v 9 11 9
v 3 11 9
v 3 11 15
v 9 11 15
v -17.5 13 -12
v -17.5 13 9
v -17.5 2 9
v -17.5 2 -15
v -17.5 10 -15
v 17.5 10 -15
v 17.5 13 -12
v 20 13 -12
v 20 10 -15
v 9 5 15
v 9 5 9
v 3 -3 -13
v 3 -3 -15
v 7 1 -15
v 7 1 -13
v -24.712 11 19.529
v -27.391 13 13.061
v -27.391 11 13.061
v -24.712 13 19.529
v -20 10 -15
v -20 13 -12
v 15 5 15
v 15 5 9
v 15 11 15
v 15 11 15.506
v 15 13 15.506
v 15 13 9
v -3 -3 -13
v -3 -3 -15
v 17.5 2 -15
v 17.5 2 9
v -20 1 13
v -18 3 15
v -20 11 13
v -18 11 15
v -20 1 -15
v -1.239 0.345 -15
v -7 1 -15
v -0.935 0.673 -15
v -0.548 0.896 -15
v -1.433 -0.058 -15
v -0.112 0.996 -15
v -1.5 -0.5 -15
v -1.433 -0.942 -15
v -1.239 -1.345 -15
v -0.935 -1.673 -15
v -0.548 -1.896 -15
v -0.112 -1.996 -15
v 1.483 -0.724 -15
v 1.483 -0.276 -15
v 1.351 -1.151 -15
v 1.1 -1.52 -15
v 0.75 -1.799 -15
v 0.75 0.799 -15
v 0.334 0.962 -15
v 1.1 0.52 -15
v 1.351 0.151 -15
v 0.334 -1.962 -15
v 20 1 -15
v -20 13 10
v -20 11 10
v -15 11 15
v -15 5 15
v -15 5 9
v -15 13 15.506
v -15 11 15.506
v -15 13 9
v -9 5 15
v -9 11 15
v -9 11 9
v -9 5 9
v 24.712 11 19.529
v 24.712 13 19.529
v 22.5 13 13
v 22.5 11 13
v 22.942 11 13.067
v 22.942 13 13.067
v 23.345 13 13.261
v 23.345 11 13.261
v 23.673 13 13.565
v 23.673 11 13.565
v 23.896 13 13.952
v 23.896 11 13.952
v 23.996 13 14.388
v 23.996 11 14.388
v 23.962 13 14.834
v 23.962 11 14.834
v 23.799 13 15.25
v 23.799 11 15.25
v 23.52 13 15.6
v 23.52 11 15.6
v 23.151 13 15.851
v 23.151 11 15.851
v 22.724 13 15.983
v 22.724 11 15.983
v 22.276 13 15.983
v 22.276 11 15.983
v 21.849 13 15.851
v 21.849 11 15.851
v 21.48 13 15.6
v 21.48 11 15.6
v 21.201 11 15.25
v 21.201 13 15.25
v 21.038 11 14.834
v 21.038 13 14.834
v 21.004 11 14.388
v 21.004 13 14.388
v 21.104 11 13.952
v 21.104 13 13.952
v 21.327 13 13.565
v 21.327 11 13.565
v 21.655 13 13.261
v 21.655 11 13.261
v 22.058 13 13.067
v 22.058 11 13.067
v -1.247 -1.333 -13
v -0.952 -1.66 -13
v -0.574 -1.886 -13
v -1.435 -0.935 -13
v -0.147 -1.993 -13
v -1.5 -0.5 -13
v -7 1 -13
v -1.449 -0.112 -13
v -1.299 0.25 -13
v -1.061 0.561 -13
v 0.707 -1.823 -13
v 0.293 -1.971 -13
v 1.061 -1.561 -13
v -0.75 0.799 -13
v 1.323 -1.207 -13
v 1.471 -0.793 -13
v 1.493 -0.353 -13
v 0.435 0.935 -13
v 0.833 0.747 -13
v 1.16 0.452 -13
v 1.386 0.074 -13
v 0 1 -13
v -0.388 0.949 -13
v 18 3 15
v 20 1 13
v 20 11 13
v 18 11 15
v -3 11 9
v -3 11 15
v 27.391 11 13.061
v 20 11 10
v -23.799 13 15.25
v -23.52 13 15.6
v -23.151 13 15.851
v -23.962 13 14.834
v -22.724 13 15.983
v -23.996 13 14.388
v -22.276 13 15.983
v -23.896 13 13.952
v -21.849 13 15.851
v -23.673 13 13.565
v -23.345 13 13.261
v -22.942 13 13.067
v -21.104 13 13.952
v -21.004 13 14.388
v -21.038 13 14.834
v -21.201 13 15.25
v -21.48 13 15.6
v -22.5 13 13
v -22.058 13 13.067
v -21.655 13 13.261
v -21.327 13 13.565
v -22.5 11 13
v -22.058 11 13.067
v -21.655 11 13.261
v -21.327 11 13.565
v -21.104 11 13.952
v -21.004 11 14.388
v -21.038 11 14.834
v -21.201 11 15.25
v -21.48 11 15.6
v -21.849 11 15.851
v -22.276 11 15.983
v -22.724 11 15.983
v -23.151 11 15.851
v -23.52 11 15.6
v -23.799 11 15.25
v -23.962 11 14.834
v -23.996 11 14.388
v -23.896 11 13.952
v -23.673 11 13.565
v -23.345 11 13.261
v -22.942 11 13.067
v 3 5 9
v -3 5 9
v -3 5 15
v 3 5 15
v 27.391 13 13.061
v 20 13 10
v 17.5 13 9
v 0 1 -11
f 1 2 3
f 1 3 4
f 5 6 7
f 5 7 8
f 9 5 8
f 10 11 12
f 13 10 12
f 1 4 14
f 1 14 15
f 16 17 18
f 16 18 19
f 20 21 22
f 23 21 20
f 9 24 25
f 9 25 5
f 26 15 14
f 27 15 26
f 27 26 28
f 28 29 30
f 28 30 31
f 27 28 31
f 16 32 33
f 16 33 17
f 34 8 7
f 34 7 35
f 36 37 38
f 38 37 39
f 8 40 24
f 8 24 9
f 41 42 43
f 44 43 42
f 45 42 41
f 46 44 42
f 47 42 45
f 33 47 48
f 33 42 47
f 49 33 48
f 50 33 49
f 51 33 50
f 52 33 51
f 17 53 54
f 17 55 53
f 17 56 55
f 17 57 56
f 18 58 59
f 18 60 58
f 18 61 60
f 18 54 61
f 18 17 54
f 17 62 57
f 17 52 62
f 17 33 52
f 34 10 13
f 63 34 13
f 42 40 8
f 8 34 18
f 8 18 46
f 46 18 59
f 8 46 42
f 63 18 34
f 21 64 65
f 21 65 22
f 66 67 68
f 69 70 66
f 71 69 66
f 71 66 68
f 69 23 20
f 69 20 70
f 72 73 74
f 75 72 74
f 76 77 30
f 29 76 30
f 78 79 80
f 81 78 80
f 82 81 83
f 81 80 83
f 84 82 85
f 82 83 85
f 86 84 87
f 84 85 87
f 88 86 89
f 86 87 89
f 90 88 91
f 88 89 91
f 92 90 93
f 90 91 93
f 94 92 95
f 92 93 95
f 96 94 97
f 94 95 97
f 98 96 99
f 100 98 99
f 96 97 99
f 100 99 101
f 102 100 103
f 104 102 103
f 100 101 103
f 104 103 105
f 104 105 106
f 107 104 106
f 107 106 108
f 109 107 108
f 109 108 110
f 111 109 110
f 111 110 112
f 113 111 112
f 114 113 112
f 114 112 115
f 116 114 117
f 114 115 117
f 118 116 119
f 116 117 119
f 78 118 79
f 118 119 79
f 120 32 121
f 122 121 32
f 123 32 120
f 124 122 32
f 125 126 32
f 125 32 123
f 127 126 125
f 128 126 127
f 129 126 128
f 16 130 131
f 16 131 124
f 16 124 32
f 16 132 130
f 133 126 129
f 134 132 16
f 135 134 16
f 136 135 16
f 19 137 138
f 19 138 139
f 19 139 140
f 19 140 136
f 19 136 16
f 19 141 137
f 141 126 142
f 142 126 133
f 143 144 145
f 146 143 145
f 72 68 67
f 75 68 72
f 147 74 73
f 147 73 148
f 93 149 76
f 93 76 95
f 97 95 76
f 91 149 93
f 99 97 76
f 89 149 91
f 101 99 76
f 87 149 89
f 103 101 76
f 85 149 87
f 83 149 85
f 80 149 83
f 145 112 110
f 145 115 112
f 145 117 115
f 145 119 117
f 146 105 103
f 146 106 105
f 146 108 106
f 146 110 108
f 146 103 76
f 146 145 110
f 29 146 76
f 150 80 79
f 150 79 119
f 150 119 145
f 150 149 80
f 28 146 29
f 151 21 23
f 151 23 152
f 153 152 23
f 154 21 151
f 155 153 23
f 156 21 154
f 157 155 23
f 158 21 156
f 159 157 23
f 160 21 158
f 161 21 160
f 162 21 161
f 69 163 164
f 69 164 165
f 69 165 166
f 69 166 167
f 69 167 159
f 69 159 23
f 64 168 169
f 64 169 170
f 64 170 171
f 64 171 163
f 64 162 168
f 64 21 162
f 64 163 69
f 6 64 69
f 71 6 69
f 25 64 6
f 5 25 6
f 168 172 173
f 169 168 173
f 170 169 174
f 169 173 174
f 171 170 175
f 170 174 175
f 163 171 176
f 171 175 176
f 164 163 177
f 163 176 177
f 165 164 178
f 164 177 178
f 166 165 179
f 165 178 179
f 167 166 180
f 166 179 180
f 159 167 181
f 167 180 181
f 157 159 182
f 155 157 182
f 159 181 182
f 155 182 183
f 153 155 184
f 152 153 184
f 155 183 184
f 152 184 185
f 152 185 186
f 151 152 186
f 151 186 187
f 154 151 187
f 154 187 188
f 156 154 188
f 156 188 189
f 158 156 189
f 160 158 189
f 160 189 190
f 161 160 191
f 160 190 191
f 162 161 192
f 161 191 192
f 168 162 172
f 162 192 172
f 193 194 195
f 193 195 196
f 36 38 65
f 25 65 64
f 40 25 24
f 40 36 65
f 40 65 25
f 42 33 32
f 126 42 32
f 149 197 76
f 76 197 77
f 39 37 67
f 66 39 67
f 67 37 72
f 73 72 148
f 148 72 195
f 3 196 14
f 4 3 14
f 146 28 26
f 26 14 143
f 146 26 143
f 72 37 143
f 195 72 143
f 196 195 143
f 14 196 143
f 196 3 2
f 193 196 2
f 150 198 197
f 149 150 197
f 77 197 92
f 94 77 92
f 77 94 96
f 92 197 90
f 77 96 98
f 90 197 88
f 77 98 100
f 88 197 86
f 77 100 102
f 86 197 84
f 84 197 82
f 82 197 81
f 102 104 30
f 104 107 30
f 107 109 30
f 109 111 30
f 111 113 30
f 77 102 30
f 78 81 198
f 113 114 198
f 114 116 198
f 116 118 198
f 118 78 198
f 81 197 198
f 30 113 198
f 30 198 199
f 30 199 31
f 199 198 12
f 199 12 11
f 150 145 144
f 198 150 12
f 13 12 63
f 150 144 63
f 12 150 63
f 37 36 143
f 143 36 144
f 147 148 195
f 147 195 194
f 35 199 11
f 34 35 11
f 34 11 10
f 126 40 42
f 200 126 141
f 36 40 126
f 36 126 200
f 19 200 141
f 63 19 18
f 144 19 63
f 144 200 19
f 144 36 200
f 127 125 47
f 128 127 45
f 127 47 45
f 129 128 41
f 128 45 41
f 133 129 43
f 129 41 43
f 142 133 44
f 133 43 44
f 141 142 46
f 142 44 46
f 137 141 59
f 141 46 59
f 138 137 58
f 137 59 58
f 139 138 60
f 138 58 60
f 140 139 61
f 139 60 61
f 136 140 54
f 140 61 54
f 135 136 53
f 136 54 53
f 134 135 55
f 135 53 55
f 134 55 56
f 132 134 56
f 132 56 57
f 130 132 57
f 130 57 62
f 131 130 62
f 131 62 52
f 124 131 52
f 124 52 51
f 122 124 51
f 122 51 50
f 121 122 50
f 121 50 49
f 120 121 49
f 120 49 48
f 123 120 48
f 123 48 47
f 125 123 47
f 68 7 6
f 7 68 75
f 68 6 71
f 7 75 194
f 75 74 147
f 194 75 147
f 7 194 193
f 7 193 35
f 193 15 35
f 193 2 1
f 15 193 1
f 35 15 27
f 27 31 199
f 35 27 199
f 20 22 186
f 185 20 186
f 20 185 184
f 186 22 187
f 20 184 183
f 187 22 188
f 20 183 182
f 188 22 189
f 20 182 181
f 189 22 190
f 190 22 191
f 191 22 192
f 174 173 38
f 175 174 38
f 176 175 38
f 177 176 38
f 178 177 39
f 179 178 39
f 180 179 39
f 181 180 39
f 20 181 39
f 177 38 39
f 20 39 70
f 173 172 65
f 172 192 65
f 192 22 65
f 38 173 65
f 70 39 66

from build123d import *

# Parameters (mm, degrees)
SKETCH1_W           = 40
SKETCH1_H           = 30
BOSS_EXTRUDE1_DEPTH = 10
SKETCH5_W           = 40
SKETCH5_H           = 27
BOSS_EXTRUDE2_DEPTH = 3
SKETCH2_W           = 11
SKETCH2_H           = 24
CUT_EXTRUDE1_DEPTH  = 11
SKETCH4_W           = 6
SKETCH4_H           = 6
CUT_EXTRUDE2_DEPTH  = 8
SKETCH6_W           = 18
SKETCH6_H           = 16
CUT_EXTRUDE3_DEPTH  = 2
CHAMFER2_SIZE       = 3
BOSS_EXTRUDE3_DEPTH = 2
SKETCH9_R           = 1.5
CUT_EXTRUDE5_DEPTH  = 2
SKETCH11_W          = 40
SKETCH11_H          = 30
CUT_EXTRUDE6_DEPTH  = 1
CHAMFER3_SIZE       = 2
SKETCH14_W          = 6
SKETCH14_H          = 2
BOSS_EXTRUDE4_DEPTH = 4
SKETCH15_R          = 1.5
CUT_EXTRUDE7_DEPTH  = 4
CHAMFER7_SIZE       = 4
SKETCH16_W          = 13
SKETCH16_H          = 6.5
CUT_EXTRUDE8_DEPTH  = 3
SKETCH17_W          = 35
SKETCH17_H          = 24
CUT_EXTRUDE9_DEPTH  = 11


with BuildPart() as part:
    # Sketch1 → Boss-Extrude1 (new body)
    with BuildSketch(Plane(origin=(0, 0, 0), x_dir=(1, 0, 0), z_dir=(0, 1, 0))):
        Rectangle(SKETCH1_W, SKETCH1_H)
    extrude(amount=BOSS_EXTRUDE1_DEPTH)

    # Sketch5 → Boss-Extrude2 (add)
    with BuildSketch(Plane(origin=(0, 10, 0), x_dir=(1, 0, 0), z_dir=(0, 1, 0))):
        with Locations((0, -1.5)):
            Rectangle(SKETCH5_W, SKETCH5_H)
    extrude(amount=BOSS_EXTRUDE2_DEPTH)

    # Sketch2 → Cut-Extrude1 (cut)
    with BuildSketch(Plane(origin=(0, 13, 0), x_dir=(1, 0, 0), z_dir=(0, 1, 0))):
        with Locations((-12, 3)):
            Rectangle(SKETCH2_W, SKETCH2_H)
        with Locations((0, 3)):
            Rectangle(SKETCH2_W, SKETCH2_H)
        with Locations((12, 3)):
            Rectangle(SKETCH2_W, SKETCH2_H)
    extrude(amount=-CUT_EXTRUDE1_DEPTH, mode=Mode.SUBTRACT)

    # Sketch4 → Cut-Extrude2 (cut)
    with BuildSketch(Plane(origin=(0, 13, 0), x_dir=(1, 0, 0), z_dir=(0, 1, 0))):
        with Locations((-12, -12)):
            Rectangle(SKETCH4_W, SKETCH4_H)
        with Locations((0, -12)):
            Rectangle(SKETCH4_W, SKETCH4_H)
        with Locations((12, -12)):
            Rectangle(SKETCH4_W, SKETCH4_H)
    extrude(amount=-CUT_EXTRUDE2_DEPTH, mode=Mode.SUBTRACT)

    # Sketch6 → Cut-Extrude3 (cut)
    with BuildSketch(Plane(origin=(0, 13, 0), x_dir=(1, 0, 0), z_dir=(0, 1, 0))):
        with Locations((0, -7)):
            Rectangle(SKETCH6_W, SKETCH6_H)
    extrude(amount=-CUT_EXTRUDE3_DEPTH, mode=Mode.SUBTRACT)

    # Chamfer2
    chamfer2_edges = [part.edges().sort_by_distance(p)[0] for p in [
        (18.75, 10, -12),
        (6, 10, -12),
        (-6, 10, -12),
        (-18.75, 10, -12),
    ]]
    chamfer(chamfer2_edges, length=CHAMFER2_SIZE - 0.0001)  # a hair under: the kernel refuses the full size

    # Sketch8 → Boss-Extrude3 (add)
    with BuildSketch(Plane(origin=(0, 13, 0), x_dir=(1, 0, 0), z_dir=(0, 1, 0))):
        Polygon((20, -10), (27.39103626, -13.061467459), (24.712252234, -19.528624186), (15, -15.50567759), (15, -15), (17.5, -9), align=None)
    boss_extrude3 = extrude(amount=-BOSS_EXTRUDE3_DEPTH)

    # Mirror1: Boss-Extrude3 across plane
    add(boss_extrude3.mirror(Plane(origin=(0, 0, 0), x_dir=(0, 0, 1), z_dir=(1, 0, 0))))

    # Sketch9 → Cut-Extrude5 (cut)
    with BuildSketch(Plane.XZ.offset(-11)):
        with Locations(Location((-22.5, 14.5, 0), (0, 0, 270))):
            Circle(SKETCH9_R)
        with Locations(Location((22.5, 14.5, 0), (0, 0, 270))):
            Circle(SKETCH9_R)
    extrude(amount=-CUT_EXTRUDE5_DEPTH, mode=Mode.SUBTRACT)

    # Sketch11 → Cut-Extrude6 (cut)
    with BuildSketch(Plane.XZ):
        Rectangle(SKETCH11_W, SKETCH11_H)
    extrude(amount=-CUT_EXTRUDE6_DEPTH, mode=Mode.SUBTRACT)

    # Chamfer3
    chamfer3_edges = [part.edges().sort_by_distance(p)[0] for p in [
        (20, 6, 15),
        (-20, 6, 15),
        (0, 1, 15),
    ]]
    chamfer(chamfer3_edges, length=CHAMFER3_SIZE)

    # Sketch14 → Boss-Extrude4 (add)
    with BuildSketch(Plane.XZ.offset(-1)):
        with Locations((0, -14)):
            Rectangle(SKETCH14_W, SKETCH14_H)
    extrude(amount=BOSS_EXTRUDE4_DEPTH)

    # Sketch15 → Cut-Extrude7 (cut)
    with BuildSketch(Plane(origin=(0, 0, -15), x_dir=(-1, 0, 0), z_dir=(0, 0, -1))):
        with Locations((0, -0.5)):
            Circle(SKETCH15_R)
    extrude(amount=-CUT_EXTRUDE7_DEPTH, mode=Mode.SUBTRACT)

    # Chamfer7
    chamfer7_edges = [part.edges().sort_by_distance(p)[0] for p in [
        (3, 1, -14),
        (-3, 1, -14),
    ]]
    chamfer(chamfer7_edges, length=CHAMFER7_SIZE - 0.0001)  # a hair under: the kernel refuses the full size

    # Sketch16 → Cut-Extrude8 (cut)
    with BuildSketch(Plane(origin=(0, 13, 0), x_dir=(1, 0, 0), z_dir=(0, 1, 0))):
        with Locations((0, 11.75)):
            Rectangle(SKETCH16_W, SKETCH16_H)
    extrude(amount=-CUT_EXTRUDE8_DEPTH, mode=Mode.SUBTRACT)

    # Sketch17 → Cut-Extrude9 (cut)
    with BuildSketch(Plane(origin=(0, 13, 0), x_dir=(1, 0, 0), z_dir=(0, 1, 0))):
        with Locations((0, 3)):
            Rectangle(SKETCH17_W, SKETCH17_H)
    extrude(amount=-CUT_EXTRUDE9_DEPTH, mode=Mode.SUBTRACT)


solid = part.part
